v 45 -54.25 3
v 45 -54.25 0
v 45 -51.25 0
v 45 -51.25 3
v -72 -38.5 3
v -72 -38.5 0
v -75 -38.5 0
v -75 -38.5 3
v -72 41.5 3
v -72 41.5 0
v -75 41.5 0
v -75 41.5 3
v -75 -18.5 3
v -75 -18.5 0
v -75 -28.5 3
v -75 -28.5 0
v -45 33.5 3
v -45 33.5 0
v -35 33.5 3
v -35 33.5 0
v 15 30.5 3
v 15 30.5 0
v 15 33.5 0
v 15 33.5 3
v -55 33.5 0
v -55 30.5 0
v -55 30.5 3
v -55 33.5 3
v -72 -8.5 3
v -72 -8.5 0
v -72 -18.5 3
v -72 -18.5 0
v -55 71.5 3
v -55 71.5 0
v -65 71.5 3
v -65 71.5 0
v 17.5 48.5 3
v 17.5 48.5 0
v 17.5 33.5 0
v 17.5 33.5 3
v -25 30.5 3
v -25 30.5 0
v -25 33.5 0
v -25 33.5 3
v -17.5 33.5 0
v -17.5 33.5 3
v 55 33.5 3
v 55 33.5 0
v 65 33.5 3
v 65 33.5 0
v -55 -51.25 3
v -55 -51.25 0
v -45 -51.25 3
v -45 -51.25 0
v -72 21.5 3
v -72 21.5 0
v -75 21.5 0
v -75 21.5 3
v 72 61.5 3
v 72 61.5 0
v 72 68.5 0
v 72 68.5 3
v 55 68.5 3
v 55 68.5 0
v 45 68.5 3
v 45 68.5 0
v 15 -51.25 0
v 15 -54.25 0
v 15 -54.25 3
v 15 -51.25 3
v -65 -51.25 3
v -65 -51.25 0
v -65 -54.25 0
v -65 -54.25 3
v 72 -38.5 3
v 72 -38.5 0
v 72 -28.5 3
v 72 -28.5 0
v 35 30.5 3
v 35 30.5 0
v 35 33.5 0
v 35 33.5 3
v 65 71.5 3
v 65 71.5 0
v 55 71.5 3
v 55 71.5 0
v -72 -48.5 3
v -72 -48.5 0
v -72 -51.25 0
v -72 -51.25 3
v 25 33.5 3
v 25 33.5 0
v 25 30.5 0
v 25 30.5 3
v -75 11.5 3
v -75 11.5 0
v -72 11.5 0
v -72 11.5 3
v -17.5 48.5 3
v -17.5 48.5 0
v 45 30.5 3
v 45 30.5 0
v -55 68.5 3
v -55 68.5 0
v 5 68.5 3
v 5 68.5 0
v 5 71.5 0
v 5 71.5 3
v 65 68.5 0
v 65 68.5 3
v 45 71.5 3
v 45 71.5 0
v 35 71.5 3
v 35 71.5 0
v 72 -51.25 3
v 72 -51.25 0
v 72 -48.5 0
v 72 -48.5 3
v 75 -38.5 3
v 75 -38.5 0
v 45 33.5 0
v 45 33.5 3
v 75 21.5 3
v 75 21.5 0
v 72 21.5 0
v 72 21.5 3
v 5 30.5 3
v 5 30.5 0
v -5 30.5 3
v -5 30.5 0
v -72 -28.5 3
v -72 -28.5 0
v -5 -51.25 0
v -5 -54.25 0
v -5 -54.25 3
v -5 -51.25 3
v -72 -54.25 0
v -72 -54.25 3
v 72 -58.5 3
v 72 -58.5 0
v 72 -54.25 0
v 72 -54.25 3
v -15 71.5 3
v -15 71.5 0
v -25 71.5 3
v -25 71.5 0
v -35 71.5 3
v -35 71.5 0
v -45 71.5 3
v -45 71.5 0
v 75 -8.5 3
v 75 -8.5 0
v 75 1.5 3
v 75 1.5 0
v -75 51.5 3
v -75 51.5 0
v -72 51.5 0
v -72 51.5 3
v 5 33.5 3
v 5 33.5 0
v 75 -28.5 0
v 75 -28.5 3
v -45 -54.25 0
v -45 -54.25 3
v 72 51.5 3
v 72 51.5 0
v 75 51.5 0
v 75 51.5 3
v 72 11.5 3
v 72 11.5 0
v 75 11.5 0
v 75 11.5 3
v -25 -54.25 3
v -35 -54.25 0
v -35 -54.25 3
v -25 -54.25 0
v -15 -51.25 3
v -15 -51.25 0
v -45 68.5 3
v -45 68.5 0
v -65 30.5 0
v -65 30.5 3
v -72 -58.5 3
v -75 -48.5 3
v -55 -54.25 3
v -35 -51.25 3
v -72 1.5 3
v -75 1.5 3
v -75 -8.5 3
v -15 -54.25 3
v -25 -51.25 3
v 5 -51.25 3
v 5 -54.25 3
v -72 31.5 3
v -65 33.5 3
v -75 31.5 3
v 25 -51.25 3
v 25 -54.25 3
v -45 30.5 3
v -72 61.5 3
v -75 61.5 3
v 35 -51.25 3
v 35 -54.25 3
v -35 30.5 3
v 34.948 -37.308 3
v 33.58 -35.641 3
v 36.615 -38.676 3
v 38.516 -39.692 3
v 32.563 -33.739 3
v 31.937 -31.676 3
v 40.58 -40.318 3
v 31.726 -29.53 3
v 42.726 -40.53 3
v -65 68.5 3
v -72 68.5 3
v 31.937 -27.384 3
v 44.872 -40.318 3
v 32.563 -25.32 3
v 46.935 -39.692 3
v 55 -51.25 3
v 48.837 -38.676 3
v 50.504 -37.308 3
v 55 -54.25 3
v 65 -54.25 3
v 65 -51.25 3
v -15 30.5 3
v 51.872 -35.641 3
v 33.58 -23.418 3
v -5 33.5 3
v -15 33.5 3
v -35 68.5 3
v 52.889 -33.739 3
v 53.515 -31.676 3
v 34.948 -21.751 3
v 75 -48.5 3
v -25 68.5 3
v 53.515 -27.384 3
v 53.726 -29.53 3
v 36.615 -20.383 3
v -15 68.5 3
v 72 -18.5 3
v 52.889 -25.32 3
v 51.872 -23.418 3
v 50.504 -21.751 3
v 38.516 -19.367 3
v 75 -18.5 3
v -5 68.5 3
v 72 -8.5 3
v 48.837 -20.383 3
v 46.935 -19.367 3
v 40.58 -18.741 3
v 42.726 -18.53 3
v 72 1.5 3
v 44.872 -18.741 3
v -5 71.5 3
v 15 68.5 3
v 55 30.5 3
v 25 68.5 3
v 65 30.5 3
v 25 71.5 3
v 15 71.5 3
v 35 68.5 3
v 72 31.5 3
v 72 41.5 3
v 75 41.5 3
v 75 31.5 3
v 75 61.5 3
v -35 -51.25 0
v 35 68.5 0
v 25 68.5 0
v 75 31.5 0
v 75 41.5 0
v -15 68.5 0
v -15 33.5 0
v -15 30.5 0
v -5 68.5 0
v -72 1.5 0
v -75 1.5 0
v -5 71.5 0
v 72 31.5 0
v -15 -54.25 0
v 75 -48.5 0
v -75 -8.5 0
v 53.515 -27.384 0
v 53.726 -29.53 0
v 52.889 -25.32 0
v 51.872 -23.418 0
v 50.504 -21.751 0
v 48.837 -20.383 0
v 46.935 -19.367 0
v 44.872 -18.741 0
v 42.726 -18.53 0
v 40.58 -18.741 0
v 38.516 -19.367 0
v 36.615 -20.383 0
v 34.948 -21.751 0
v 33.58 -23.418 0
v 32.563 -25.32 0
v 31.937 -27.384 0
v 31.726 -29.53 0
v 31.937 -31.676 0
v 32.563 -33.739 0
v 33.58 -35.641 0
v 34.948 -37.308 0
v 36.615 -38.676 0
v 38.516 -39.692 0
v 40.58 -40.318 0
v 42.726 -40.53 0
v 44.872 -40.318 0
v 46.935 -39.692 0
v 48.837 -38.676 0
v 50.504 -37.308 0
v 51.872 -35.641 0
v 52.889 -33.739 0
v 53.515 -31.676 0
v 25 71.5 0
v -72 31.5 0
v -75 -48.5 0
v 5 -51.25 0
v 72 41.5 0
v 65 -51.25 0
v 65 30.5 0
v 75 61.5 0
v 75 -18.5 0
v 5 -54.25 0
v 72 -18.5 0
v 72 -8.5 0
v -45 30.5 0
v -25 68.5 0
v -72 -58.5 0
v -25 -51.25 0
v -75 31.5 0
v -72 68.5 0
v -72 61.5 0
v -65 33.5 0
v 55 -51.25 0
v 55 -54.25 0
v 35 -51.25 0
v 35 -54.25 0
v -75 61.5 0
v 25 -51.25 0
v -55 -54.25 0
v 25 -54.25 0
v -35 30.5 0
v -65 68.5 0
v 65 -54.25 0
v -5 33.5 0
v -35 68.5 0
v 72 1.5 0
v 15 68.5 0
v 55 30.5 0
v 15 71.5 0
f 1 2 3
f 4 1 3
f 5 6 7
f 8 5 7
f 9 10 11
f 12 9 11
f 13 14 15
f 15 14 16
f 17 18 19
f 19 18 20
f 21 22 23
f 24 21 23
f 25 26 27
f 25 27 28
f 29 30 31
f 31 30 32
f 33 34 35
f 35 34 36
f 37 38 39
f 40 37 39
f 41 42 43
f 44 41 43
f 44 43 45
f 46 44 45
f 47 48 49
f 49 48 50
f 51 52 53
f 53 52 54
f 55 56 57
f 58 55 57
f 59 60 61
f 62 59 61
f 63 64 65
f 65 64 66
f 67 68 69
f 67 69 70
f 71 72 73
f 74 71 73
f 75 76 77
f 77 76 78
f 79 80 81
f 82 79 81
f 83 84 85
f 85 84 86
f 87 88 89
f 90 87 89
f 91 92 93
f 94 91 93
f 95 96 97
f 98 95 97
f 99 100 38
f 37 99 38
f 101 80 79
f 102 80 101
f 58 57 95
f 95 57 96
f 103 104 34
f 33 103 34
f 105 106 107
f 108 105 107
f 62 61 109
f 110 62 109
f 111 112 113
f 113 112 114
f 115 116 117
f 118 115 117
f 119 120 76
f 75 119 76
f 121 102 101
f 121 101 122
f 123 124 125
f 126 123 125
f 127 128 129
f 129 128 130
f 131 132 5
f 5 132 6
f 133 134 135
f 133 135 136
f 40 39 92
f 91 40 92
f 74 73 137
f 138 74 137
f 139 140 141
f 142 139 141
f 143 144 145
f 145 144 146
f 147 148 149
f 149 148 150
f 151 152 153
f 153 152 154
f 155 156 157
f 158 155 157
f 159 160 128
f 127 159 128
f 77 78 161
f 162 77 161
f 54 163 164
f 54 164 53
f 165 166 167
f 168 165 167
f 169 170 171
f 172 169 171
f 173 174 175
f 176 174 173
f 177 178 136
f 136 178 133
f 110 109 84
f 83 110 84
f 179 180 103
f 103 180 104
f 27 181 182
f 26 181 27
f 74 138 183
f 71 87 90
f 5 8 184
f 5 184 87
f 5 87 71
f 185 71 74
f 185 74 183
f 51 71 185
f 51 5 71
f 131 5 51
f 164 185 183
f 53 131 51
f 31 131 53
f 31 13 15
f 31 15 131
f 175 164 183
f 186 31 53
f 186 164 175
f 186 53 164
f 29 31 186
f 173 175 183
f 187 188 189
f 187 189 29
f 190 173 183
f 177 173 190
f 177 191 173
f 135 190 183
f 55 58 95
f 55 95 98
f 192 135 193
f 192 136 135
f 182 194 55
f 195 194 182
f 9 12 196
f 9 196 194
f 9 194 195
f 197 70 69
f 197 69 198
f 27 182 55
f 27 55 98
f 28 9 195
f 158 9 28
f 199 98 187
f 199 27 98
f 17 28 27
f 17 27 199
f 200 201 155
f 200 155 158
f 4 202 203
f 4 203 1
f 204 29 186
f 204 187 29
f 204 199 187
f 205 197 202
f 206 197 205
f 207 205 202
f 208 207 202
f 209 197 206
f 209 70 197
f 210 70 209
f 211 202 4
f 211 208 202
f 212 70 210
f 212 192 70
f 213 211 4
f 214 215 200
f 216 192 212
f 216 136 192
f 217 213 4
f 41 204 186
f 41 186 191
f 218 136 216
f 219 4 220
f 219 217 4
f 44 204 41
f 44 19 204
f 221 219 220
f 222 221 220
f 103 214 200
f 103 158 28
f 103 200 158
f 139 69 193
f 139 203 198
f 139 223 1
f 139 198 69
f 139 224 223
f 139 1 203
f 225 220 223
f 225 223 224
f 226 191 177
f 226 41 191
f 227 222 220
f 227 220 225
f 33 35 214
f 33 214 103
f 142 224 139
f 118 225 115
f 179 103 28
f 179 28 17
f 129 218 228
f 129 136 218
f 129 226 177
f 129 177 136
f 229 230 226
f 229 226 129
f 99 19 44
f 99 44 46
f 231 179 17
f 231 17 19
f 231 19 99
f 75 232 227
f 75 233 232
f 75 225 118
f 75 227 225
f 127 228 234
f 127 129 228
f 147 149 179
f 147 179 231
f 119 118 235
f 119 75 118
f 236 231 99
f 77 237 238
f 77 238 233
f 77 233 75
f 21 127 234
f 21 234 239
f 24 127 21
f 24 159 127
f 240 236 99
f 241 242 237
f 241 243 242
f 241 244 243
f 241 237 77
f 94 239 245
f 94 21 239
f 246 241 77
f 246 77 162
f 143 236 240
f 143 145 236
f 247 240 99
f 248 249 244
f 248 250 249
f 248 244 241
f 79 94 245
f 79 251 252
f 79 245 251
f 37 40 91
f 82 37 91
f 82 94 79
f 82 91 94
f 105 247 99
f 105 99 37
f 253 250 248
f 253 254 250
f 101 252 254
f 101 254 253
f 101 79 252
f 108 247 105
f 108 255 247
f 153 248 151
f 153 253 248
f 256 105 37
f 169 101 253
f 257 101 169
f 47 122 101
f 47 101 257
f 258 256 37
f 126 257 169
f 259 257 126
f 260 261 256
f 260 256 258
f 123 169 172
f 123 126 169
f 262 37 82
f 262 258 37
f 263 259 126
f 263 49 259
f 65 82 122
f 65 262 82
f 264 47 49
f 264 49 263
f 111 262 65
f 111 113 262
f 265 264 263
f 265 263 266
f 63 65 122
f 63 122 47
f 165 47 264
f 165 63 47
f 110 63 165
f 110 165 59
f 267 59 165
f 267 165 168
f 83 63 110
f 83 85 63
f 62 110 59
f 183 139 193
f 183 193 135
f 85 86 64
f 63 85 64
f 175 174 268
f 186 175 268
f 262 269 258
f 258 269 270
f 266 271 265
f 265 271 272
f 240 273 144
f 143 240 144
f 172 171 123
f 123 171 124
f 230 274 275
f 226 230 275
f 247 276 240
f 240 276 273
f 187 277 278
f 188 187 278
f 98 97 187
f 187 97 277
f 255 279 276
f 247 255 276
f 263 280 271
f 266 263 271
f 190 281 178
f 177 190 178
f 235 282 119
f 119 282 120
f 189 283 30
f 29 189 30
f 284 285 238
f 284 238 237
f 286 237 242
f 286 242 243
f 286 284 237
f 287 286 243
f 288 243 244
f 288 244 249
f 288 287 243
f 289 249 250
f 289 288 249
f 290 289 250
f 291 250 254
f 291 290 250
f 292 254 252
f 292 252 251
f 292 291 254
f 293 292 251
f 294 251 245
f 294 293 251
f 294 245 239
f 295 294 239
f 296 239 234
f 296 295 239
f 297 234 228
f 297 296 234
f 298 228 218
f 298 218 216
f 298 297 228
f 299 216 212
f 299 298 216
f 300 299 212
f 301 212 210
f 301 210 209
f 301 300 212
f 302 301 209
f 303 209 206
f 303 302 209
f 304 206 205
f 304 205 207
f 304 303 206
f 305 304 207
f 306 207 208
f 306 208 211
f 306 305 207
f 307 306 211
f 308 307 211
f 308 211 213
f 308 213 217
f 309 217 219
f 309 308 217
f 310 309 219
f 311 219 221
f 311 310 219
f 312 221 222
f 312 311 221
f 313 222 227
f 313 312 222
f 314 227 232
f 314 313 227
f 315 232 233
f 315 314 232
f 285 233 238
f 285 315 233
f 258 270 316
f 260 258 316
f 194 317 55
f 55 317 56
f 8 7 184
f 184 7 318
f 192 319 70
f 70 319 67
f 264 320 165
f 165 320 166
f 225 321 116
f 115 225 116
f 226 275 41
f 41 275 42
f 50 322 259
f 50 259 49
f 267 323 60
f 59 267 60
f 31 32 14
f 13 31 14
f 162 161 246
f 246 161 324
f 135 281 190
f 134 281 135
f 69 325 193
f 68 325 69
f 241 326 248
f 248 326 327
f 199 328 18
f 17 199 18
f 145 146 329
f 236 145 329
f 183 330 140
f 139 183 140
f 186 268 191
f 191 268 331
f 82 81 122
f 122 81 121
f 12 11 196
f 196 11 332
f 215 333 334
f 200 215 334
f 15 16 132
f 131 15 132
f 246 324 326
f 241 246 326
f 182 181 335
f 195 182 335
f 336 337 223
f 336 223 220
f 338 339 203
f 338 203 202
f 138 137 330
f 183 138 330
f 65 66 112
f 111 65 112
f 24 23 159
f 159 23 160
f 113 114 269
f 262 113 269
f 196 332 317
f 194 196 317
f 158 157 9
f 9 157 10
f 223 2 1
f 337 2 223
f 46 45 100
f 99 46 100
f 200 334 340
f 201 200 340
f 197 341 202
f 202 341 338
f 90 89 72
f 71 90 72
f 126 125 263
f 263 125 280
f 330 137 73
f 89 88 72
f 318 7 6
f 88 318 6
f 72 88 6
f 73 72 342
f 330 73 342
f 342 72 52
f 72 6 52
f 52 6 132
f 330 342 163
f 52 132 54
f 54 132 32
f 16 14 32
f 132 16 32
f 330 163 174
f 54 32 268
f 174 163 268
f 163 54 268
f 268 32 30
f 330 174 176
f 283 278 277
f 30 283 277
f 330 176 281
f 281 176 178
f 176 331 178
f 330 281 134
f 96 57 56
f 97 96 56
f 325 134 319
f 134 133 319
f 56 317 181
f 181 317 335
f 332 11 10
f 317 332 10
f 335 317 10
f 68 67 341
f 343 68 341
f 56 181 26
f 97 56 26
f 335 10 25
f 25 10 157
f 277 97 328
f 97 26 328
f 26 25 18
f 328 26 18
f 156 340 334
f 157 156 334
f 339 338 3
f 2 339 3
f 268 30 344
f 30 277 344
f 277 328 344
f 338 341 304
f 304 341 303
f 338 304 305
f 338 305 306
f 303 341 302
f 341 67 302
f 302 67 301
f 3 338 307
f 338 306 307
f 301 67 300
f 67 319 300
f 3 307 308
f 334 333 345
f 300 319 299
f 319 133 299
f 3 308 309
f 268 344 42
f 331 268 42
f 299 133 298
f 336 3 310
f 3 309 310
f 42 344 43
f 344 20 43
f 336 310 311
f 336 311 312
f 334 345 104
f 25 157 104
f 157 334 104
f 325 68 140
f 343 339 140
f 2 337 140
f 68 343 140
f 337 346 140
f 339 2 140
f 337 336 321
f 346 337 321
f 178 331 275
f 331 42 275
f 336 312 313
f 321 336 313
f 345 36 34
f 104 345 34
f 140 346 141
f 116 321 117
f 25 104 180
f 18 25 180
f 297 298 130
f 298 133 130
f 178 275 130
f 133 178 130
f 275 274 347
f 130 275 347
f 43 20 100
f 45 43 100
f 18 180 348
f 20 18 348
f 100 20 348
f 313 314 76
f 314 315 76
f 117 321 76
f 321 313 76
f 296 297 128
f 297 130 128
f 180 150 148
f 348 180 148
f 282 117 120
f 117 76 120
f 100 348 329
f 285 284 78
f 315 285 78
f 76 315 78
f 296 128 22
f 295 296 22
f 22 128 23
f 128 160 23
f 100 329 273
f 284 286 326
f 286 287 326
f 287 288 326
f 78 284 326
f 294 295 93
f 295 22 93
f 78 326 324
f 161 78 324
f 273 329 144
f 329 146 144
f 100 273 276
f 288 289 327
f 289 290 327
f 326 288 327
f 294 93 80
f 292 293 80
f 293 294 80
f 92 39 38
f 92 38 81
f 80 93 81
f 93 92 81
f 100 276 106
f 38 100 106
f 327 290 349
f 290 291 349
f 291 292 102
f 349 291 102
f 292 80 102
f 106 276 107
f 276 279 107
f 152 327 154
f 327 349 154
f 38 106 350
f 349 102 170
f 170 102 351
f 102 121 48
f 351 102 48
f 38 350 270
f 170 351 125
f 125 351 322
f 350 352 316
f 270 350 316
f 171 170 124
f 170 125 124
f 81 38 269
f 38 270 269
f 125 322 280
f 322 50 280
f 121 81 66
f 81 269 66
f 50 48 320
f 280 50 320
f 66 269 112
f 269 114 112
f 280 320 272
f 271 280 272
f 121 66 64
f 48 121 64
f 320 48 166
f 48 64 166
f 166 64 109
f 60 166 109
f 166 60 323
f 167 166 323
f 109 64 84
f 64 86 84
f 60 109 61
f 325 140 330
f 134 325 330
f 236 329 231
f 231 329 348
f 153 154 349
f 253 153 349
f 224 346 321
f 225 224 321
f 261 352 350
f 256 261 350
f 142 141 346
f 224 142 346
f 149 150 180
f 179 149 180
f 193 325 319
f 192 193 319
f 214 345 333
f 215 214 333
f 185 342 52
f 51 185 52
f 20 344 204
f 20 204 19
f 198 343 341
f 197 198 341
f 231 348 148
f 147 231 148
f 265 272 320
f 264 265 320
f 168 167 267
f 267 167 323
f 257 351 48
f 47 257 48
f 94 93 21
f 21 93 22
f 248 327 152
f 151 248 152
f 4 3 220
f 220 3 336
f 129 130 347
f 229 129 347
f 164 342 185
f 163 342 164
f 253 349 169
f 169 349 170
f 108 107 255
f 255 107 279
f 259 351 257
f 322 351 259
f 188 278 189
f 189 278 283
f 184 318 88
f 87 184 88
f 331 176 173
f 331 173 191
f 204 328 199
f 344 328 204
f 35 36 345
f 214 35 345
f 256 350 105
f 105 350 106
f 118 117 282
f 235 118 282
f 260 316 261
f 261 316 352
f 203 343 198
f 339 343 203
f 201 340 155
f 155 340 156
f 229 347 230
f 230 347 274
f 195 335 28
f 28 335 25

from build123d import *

# Parameters (mm, degrees)
CROQUIS1_W              = 10
CROQUIS1_H              = 3
CROQUIS1_R              = 11
SALIENTE_EXTRUIR1_DEPTH = 3


with BuildPart() as part:
    # Croquis1 → Saliente-Extruir1 (new body)
    with BuildSketch(Plane.XY):
        Polygon((-35, 71.5), (-45, 71.5), (-45, 68.5), (-55, 68.5), (-55, 71.5), (-65, 71.5), (-65, 68.5), (-72, 68.5), (-72, 61.5), (-75, 61.5), (-75, 51.5), (-72, 51.5), (-72, 41.5), (-75, 41.5), (-75, 31.5), (-72, 31.5), (-72, 21.5), (-75, 21.5), (-75, 11.5), (-72, 11.5), (-72, 1.5), (-75, 1.5), (-75, -8.5), (-72, -8.5), (-72, -18.5), (-75, -18.5), (-75, -28.5), (-72, -28.5), (-72, -38.5), (-75, -38.5), (-75, -48.5), (-72, -48.5), (-72, -51.25), (-65, -51.25), (-65, -54.25), (-72, -54.25), (-72, -58.5), (72, -58.5), (72, -54.25), (65, -54.25), (65, -51.25), (72, -51.25), (72, -48.5), (75, -48.5), (75, -38.5), (72, -38.5), (72, -28.5), (75, -28.5), (75, -18.5), (72, -18.5), (72, -8.5), (75, -8.5), (75, 1.5), (72, 1.5), (72, 11.5), (75, 11.5), (75, 21.5), (72, 21.5), (72, 31.5), (75, 31.5), (75, 41.5), (72, 41.5), (72, 51.5), (75, 51.5), (75, 61.5), (72, 61.5), (72, 68.5), (65, 68.5), (65, 71.5), (55, 71.5), (55, 68.5), (45, 68.5), (45, 71.5), (35, 71.5), (35, 68.5), (25, 68.5), (25, 71.5), (15, 71.5), (15, 68.5), (5, 68.5), (5, 71.5), (-5, 71.5), (-5, 68.5), (-15, 68.5), (-15, 71.5), (-25, 71.5), (-25, 68.5), (-35, 68.5), align=None)
        with Locations((-50, -52.75)):
            Rectangle(CROQUIS1_W, CROQUIS1_H, mode=Mode.SUBTRACT)
        with Locations((-30, -52.75)):
            Rectangle(CROQUIS1_W, CROQUIS1_H, mode=Mode.SUBTRACT)
        with Locations((-10, -52.75)):
            Rectangle(CROQUIS1_W, CROQUIS1_H, mode=Mode.SUBTRACT)
        with Locations((10, -52.75)):
            Rectangle(CROQUIS1_W, CROQUIS1_H, mode=Mode.SUBTRACT)
        with Locations((30, -52.75)):
            Rectangle(CROQUIS1_W, CROQUIS1_H, mode=Mode.SUBTRACT)
        with Locations((50, -52.75)):
            Rectangle(CROQUIS1_W, CROQUIS1_H, mode=Mode.SUBTRACT)
        with Locations((42.725871833, -29.529627422)):
            Circle(CROQUIS1_R, mode=Mode.SUBTRACT)
        with Locations((-60, 32)):
            Rectangle(CROQUIS1_W, CROQUIS1_H, mode=Mode.SUBTRACT)
        with Locations((-40, 32)):
            Rectangle(CROQUIS1_W, CROQUIS1_H, mode=Mode.SUBTRACT)
        Polygon((-25, 30.5), (-25, 33.5), (-17.5, 33.5), (-17.5, 48.5), (17.5, 48.5), (17.5, 33.5), (25, 33.5), (25, 30.5), (15, 30.5), (15, 33.5), (5, 33.5), (5, 30.5), (-5, 30.5), (-5, 33.5), (-15, 33.5), (-15, 30.5), align=None, mode=Mode.SUBTRACT)
        with Locations((40, 32)):
            Rectangle(CROQUIS1_W, CROQUIS1_H, mode=Mode.SUBTRACT)
        with Locations((60, 32)):
            Rectangle(CROQUIS1_W, CROQUIS1_H, mode=Mode.SUBTRACT)
    extrude(amount=SALIENTE_EXTRUIR1_DEPTH)


solid = part.part
